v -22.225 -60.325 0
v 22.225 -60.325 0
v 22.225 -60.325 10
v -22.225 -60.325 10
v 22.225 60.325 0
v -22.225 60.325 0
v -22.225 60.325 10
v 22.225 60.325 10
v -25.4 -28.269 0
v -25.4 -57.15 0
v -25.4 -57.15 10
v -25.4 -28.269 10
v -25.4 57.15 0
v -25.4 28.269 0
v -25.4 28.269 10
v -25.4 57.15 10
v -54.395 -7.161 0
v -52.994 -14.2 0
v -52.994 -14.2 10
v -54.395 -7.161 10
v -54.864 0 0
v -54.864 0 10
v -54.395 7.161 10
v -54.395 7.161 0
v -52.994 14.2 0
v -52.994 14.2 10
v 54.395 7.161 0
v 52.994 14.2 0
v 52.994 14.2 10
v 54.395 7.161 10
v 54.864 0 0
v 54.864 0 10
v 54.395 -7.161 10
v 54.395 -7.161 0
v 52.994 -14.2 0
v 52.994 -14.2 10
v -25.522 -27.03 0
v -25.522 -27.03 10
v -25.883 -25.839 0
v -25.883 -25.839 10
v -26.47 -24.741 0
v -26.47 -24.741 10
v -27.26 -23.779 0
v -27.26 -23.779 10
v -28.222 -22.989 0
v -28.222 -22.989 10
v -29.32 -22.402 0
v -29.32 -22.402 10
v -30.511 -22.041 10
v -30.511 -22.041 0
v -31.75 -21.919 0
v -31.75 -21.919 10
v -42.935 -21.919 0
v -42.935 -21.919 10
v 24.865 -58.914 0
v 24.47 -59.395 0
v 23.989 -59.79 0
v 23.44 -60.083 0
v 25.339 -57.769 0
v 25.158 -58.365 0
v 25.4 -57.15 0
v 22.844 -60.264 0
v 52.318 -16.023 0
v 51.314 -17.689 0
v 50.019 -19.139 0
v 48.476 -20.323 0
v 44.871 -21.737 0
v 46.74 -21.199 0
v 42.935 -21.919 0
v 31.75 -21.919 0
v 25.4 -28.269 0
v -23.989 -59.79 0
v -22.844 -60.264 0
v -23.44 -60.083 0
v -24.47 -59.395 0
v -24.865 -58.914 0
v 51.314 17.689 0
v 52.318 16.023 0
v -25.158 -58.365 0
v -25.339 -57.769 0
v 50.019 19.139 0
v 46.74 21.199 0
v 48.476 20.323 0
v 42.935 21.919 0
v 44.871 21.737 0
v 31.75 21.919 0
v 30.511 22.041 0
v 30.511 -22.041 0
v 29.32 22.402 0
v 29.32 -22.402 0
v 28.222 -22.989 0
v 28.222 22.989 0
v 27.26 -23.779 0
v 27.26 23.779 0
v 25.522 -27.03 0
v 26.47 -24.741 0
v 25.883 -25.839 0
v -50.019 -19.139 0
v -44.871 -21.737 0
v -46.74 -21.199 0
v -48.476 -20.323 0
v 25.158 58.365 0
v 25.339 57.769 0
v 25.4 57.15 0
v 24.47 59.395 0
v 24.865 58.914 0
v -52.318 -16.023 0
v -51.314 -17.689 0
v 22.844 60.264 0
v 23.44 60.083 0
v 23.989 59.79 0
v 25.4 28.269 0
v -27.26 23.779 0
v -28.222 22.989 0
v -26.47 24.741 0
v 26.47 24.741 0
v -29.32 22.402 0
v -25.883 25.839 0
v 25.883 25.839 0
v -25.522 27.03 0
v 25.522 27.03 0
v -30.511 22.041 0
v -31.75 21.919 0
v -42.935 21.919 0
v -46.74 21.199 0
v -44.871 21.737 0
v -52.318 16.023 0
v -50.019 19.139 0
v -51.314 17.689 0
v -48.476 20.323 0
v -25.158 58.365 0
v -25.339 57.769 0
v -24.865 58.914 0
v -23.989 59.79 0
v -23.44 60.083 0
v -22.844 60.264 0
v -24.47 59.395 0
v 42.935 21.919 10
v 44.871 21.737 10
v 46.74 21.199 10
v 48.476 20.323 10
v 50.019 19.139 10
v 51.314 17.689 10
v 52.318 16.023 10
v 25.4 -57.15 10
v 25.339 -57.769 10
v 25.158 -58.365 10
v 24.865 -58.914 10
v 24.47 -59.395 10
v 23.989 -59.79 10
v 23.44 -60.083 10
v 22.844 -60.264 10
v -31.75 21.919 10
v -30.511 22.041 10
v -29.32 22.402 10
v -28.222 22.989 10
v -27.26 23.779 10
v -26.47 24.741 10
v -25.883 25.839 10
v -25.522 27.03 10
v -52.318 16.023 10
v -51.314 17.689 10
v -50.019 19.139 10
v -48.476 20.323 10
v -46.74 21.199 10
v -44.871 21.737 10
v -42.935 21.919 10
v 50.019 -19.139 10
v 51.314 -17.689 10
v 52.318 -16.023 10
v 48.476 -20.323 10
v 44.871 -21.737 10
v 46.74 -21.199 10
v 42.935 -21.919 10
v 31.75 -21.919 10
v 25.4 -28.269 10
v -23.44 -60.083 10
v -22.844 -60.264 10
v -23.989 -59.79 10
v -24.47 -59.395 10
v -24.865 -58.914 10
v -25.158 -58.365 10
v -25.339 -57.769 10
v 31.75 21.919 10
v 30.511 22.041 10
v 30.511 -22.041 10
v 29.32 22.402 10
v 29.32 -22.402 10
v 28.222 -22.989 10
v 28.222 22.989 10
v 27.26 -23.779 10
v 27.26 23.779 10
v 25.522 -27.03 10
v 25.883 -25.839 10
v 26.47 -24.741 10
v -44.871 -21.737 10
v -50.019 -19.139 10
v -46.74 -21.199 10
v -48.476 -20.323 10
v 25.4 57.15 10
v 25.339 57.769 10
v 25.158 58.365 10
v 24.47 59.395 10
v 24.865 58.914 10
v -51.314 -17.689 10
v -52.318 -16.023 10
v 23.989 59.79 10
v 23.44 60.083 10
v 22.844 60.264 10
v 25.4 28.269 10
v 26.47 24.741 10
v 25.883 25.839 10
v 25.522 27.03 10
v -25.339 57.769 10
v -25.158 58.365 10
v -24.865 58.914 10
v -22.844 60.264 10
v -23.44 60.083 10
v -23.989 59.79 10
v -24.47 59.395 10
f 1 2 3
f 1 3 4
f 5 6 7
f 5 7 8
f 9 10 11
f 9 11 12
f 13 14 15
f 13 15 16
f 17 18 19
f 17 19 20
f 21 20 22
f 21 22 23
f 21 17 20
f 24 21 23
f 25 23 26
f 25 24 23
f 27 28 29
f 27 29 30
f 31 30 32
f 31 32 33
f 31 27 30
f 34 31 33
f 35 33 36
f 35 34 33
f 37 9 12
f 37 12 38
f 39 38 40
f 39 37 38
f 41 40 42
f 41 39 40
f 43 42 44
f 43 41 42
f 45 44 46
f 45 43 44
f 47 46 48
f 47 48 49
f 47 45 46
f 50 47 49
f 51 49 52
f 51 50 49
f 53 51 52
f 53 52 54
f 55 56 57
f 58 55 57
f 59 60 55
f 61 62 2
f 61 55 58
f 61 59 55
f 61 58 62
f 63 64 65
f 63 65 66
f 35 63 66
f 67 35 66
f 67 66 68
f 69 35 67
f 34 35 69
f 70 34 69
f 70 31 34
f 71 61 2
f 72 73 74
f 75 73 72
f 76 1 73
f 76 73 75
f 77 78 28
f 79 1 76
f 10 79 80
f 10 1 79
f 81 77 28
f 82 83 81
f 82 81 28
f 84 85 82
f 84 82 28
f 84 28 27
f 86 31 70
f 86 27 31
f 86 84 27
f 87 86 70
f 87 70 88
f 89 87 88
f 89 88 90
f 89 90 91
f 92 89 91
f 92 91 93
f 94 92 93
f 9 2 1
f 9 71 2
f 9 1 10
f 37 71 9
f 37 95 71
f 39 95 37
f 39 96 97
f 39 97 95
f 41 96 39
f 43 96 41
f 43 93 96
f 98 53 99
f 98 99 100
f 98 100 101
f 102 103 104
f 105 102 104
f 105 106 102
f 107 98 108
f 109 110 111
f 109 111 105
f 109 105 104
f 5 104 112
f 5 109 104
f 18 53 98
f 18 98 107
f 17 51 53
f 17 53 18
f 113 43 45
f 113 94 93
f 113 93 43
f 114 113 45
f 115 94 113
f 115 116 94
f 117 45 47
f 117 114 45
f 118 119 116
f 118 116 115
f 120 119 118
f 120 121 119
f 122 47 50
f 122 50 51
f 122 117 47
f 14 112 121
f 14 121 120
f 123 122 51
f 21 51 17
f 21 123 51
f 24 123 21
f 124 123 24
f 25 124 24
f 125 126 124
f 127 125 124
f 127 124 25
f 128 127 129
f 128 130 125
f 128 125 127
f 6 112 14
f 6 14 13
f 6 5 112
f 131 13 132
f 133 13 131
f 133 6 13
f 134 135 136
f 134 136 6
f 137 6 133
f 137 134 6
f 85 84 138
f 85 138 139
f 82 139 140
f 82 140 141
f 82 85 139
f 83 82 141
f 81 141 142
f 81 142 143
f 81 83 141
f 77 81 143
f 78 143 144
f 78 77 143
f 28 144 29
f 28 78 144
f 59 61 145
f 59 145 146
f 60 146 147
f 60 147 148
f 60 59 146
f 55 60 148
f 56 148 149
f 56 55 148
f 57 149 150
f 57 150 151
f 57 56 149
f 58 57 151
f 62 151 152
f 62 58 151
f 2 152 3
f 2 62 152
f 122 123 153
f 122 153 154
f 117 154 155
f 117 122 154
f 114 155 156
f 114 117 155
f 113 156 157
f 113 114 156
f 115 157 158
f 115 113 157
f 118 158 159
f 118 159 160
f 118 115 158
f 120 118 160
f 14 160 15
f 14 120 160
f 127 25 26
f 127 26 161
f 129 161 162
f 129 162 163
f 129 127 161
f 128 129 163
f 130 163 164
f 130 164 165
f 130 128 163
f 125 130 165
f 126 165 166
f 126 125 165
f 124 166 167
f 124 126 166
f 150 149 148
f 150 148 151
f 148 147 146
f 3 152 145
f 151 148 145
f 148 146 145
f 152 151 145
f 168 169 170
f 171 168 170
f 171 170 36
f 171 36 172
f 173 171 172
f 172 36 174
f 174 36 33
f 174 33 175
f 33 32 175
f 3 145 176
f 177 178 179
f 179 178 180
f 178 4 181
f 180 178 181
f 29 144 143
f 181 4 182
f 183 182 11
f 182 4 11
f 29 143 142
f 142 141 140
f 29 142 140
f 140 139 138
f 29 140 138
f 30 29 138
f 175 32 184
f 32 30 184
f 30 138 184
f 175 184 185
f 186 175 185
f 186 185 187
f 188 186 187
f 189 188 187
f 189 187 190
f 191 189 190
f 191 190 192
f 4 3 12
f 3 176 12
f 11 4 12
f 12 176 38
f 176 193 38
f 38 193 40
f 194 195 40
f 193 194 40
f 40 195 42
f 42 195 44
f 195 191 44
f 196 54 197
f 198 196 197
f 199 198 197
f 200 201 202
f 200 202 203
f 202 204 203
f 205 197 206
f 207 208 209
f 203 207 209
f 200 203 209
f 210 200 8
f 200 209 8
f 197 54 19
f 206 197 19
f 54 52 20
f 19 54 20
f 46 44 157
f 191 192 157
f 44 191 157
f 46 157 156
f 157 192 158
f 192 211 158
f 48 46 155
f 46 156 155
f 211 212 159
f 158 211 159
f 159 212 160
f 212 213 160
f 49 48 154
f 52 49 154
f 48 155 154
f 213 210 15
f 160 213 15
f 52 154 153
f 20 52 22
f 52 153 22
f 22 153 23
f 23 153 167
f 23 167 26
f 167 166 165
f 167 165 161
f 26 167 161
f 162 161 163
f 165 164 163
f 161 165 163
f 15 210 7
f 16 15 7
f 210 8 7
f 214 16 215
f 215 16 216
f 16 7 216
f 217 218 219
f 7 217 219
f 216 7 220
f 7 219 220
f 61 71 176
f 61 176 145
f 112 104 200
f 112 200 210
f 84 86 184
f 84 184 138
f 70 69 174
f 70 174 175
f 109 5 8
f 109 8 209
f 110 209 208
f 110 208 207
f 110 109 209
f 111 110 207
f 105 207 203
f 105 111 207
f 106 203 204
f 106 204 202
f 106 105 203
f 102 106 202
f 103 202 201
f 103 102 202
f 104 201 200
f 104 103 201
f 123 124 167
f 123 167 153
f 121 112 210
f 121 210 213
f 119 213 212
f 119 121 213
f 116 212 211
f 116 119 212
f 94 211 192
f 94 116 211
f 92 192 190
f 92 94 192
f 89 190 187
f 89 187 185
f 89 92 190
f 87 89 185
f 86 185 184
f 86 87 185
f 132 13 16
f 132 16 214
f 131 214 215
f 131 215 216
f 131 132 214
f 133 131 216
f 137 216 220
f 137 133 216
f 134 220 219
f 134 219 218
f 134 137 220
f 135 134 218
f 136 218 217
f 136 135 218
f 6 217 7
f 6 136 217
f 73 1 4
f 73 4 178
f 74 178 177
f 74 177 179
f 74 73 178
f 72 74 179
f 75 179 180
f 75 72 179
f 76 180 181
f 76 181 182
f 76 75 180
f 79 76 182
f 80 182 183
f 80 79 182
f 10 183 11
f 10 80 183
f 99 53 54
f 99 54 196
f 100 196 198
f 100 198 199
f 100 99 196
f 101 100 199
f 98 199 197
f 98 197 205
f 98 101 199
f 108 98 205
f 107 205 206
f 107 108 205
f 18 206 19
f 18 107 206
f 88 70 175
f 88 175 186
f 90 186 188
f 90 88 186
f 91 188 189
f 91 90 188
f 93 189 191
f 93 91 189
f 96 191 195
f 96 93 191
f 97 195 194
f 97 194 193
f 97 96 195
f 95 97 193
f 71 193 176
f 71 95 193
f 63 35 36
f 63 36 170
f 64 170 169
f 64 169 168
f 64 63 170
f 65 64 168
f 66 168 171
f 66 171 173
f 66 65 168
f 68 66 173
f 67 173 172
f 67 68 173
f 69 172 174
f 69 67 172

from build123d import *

# Parameters (mm, degrees)
BOSS_EXTRUDE1_DEPTH = 10


with BuildPart() as part:
    # Sketch1 → Boss-Extrude1 (new body)
    with BuildSketch(Plane.XY):
        with BuildLine():
            Line((-25.4, -57.15), (-25.4, -28.26893))
            ThreePointArc((-25.4, -28.26893), (-27.259871939, -23.778801939), (-31.75, -21.91893))
            Line((-31.75, -21.91893), (-42.935289515, -21.91893))
            ThreePointArc((-42.935289515, -21.91893), (-49.274890295, -19.766942948), (-52.994414486, -14.200370743))
            ThreePointArc((-52.994414486, -14.200370743), (-54.864, 0), (-52.994414486, 14.200370743))
            ThreePointArc((-52.994414486, 14.200370743), (-49.274890295, 19.766942948), (-42.935289515, 21.91893))
            Line((-42.935289515, 21.91893), (-31.75, 21.91893))
            ThreePointArc((-31.75, 21.91893), (-27.259871939, 23.778801939), (-25.4, 28.26893))
            Line((-25.4, 28.26893), (-25.4, 57.15))
            ThreePointArc((-25.4, 57.15), (-24.47006403, 59.39506403), (-22.225, 60.325))
            Line((-22.225, 60.325), (22.225, 60.325))
            ThreePointArc((22.225, 60.325), (24.47006403, 59.39506403), (25.4, 57.15))
            Line((25.4, 57.15), (25.4, 28.26893))
            ThreePointArc((25.4, 28.26893), (27.259871939, 23.778801939), (31.75, 21.91893))
            Line((31.75, 21.91893), (42.935289515, 21.91893))
            ThreePointArc((42.935289515, 21.91893), (49.274890295, 19.766942948), (52.994414486, 14.200370743))
            ThreePointArc((52.994414486, 14.200370743), (54.864, 0), (52.994414486, -14.200370743))
            ThreePointArc((52.994414486, -14.200370743), (49.274890295, -19.766942948), (42.935289515, -21.91893))
            Line((42.935289515, -21.91893), (31.75, -21.91893))
            ThreePointArc((31.75, -21.91893), (27.259871939, -23.778801939), (25.4, -28.26893))
            Line((25.4, -28.26893), (25.4, -57.15))
            ThreePointArc((25.4, -57.15), (24.47006403, -59.39506403), (22.225, -60.325))
            Line((22.225, -60.325), (-22.225, -60.325))
            ThreePointArc((-22.225, -60.325), (-24.47006403, -59.39506403), (-25.4, -57.15))
        make_face()
    extrude(amount=BOSS_EXTRUDE1_DEPTH)


solid = part.part
